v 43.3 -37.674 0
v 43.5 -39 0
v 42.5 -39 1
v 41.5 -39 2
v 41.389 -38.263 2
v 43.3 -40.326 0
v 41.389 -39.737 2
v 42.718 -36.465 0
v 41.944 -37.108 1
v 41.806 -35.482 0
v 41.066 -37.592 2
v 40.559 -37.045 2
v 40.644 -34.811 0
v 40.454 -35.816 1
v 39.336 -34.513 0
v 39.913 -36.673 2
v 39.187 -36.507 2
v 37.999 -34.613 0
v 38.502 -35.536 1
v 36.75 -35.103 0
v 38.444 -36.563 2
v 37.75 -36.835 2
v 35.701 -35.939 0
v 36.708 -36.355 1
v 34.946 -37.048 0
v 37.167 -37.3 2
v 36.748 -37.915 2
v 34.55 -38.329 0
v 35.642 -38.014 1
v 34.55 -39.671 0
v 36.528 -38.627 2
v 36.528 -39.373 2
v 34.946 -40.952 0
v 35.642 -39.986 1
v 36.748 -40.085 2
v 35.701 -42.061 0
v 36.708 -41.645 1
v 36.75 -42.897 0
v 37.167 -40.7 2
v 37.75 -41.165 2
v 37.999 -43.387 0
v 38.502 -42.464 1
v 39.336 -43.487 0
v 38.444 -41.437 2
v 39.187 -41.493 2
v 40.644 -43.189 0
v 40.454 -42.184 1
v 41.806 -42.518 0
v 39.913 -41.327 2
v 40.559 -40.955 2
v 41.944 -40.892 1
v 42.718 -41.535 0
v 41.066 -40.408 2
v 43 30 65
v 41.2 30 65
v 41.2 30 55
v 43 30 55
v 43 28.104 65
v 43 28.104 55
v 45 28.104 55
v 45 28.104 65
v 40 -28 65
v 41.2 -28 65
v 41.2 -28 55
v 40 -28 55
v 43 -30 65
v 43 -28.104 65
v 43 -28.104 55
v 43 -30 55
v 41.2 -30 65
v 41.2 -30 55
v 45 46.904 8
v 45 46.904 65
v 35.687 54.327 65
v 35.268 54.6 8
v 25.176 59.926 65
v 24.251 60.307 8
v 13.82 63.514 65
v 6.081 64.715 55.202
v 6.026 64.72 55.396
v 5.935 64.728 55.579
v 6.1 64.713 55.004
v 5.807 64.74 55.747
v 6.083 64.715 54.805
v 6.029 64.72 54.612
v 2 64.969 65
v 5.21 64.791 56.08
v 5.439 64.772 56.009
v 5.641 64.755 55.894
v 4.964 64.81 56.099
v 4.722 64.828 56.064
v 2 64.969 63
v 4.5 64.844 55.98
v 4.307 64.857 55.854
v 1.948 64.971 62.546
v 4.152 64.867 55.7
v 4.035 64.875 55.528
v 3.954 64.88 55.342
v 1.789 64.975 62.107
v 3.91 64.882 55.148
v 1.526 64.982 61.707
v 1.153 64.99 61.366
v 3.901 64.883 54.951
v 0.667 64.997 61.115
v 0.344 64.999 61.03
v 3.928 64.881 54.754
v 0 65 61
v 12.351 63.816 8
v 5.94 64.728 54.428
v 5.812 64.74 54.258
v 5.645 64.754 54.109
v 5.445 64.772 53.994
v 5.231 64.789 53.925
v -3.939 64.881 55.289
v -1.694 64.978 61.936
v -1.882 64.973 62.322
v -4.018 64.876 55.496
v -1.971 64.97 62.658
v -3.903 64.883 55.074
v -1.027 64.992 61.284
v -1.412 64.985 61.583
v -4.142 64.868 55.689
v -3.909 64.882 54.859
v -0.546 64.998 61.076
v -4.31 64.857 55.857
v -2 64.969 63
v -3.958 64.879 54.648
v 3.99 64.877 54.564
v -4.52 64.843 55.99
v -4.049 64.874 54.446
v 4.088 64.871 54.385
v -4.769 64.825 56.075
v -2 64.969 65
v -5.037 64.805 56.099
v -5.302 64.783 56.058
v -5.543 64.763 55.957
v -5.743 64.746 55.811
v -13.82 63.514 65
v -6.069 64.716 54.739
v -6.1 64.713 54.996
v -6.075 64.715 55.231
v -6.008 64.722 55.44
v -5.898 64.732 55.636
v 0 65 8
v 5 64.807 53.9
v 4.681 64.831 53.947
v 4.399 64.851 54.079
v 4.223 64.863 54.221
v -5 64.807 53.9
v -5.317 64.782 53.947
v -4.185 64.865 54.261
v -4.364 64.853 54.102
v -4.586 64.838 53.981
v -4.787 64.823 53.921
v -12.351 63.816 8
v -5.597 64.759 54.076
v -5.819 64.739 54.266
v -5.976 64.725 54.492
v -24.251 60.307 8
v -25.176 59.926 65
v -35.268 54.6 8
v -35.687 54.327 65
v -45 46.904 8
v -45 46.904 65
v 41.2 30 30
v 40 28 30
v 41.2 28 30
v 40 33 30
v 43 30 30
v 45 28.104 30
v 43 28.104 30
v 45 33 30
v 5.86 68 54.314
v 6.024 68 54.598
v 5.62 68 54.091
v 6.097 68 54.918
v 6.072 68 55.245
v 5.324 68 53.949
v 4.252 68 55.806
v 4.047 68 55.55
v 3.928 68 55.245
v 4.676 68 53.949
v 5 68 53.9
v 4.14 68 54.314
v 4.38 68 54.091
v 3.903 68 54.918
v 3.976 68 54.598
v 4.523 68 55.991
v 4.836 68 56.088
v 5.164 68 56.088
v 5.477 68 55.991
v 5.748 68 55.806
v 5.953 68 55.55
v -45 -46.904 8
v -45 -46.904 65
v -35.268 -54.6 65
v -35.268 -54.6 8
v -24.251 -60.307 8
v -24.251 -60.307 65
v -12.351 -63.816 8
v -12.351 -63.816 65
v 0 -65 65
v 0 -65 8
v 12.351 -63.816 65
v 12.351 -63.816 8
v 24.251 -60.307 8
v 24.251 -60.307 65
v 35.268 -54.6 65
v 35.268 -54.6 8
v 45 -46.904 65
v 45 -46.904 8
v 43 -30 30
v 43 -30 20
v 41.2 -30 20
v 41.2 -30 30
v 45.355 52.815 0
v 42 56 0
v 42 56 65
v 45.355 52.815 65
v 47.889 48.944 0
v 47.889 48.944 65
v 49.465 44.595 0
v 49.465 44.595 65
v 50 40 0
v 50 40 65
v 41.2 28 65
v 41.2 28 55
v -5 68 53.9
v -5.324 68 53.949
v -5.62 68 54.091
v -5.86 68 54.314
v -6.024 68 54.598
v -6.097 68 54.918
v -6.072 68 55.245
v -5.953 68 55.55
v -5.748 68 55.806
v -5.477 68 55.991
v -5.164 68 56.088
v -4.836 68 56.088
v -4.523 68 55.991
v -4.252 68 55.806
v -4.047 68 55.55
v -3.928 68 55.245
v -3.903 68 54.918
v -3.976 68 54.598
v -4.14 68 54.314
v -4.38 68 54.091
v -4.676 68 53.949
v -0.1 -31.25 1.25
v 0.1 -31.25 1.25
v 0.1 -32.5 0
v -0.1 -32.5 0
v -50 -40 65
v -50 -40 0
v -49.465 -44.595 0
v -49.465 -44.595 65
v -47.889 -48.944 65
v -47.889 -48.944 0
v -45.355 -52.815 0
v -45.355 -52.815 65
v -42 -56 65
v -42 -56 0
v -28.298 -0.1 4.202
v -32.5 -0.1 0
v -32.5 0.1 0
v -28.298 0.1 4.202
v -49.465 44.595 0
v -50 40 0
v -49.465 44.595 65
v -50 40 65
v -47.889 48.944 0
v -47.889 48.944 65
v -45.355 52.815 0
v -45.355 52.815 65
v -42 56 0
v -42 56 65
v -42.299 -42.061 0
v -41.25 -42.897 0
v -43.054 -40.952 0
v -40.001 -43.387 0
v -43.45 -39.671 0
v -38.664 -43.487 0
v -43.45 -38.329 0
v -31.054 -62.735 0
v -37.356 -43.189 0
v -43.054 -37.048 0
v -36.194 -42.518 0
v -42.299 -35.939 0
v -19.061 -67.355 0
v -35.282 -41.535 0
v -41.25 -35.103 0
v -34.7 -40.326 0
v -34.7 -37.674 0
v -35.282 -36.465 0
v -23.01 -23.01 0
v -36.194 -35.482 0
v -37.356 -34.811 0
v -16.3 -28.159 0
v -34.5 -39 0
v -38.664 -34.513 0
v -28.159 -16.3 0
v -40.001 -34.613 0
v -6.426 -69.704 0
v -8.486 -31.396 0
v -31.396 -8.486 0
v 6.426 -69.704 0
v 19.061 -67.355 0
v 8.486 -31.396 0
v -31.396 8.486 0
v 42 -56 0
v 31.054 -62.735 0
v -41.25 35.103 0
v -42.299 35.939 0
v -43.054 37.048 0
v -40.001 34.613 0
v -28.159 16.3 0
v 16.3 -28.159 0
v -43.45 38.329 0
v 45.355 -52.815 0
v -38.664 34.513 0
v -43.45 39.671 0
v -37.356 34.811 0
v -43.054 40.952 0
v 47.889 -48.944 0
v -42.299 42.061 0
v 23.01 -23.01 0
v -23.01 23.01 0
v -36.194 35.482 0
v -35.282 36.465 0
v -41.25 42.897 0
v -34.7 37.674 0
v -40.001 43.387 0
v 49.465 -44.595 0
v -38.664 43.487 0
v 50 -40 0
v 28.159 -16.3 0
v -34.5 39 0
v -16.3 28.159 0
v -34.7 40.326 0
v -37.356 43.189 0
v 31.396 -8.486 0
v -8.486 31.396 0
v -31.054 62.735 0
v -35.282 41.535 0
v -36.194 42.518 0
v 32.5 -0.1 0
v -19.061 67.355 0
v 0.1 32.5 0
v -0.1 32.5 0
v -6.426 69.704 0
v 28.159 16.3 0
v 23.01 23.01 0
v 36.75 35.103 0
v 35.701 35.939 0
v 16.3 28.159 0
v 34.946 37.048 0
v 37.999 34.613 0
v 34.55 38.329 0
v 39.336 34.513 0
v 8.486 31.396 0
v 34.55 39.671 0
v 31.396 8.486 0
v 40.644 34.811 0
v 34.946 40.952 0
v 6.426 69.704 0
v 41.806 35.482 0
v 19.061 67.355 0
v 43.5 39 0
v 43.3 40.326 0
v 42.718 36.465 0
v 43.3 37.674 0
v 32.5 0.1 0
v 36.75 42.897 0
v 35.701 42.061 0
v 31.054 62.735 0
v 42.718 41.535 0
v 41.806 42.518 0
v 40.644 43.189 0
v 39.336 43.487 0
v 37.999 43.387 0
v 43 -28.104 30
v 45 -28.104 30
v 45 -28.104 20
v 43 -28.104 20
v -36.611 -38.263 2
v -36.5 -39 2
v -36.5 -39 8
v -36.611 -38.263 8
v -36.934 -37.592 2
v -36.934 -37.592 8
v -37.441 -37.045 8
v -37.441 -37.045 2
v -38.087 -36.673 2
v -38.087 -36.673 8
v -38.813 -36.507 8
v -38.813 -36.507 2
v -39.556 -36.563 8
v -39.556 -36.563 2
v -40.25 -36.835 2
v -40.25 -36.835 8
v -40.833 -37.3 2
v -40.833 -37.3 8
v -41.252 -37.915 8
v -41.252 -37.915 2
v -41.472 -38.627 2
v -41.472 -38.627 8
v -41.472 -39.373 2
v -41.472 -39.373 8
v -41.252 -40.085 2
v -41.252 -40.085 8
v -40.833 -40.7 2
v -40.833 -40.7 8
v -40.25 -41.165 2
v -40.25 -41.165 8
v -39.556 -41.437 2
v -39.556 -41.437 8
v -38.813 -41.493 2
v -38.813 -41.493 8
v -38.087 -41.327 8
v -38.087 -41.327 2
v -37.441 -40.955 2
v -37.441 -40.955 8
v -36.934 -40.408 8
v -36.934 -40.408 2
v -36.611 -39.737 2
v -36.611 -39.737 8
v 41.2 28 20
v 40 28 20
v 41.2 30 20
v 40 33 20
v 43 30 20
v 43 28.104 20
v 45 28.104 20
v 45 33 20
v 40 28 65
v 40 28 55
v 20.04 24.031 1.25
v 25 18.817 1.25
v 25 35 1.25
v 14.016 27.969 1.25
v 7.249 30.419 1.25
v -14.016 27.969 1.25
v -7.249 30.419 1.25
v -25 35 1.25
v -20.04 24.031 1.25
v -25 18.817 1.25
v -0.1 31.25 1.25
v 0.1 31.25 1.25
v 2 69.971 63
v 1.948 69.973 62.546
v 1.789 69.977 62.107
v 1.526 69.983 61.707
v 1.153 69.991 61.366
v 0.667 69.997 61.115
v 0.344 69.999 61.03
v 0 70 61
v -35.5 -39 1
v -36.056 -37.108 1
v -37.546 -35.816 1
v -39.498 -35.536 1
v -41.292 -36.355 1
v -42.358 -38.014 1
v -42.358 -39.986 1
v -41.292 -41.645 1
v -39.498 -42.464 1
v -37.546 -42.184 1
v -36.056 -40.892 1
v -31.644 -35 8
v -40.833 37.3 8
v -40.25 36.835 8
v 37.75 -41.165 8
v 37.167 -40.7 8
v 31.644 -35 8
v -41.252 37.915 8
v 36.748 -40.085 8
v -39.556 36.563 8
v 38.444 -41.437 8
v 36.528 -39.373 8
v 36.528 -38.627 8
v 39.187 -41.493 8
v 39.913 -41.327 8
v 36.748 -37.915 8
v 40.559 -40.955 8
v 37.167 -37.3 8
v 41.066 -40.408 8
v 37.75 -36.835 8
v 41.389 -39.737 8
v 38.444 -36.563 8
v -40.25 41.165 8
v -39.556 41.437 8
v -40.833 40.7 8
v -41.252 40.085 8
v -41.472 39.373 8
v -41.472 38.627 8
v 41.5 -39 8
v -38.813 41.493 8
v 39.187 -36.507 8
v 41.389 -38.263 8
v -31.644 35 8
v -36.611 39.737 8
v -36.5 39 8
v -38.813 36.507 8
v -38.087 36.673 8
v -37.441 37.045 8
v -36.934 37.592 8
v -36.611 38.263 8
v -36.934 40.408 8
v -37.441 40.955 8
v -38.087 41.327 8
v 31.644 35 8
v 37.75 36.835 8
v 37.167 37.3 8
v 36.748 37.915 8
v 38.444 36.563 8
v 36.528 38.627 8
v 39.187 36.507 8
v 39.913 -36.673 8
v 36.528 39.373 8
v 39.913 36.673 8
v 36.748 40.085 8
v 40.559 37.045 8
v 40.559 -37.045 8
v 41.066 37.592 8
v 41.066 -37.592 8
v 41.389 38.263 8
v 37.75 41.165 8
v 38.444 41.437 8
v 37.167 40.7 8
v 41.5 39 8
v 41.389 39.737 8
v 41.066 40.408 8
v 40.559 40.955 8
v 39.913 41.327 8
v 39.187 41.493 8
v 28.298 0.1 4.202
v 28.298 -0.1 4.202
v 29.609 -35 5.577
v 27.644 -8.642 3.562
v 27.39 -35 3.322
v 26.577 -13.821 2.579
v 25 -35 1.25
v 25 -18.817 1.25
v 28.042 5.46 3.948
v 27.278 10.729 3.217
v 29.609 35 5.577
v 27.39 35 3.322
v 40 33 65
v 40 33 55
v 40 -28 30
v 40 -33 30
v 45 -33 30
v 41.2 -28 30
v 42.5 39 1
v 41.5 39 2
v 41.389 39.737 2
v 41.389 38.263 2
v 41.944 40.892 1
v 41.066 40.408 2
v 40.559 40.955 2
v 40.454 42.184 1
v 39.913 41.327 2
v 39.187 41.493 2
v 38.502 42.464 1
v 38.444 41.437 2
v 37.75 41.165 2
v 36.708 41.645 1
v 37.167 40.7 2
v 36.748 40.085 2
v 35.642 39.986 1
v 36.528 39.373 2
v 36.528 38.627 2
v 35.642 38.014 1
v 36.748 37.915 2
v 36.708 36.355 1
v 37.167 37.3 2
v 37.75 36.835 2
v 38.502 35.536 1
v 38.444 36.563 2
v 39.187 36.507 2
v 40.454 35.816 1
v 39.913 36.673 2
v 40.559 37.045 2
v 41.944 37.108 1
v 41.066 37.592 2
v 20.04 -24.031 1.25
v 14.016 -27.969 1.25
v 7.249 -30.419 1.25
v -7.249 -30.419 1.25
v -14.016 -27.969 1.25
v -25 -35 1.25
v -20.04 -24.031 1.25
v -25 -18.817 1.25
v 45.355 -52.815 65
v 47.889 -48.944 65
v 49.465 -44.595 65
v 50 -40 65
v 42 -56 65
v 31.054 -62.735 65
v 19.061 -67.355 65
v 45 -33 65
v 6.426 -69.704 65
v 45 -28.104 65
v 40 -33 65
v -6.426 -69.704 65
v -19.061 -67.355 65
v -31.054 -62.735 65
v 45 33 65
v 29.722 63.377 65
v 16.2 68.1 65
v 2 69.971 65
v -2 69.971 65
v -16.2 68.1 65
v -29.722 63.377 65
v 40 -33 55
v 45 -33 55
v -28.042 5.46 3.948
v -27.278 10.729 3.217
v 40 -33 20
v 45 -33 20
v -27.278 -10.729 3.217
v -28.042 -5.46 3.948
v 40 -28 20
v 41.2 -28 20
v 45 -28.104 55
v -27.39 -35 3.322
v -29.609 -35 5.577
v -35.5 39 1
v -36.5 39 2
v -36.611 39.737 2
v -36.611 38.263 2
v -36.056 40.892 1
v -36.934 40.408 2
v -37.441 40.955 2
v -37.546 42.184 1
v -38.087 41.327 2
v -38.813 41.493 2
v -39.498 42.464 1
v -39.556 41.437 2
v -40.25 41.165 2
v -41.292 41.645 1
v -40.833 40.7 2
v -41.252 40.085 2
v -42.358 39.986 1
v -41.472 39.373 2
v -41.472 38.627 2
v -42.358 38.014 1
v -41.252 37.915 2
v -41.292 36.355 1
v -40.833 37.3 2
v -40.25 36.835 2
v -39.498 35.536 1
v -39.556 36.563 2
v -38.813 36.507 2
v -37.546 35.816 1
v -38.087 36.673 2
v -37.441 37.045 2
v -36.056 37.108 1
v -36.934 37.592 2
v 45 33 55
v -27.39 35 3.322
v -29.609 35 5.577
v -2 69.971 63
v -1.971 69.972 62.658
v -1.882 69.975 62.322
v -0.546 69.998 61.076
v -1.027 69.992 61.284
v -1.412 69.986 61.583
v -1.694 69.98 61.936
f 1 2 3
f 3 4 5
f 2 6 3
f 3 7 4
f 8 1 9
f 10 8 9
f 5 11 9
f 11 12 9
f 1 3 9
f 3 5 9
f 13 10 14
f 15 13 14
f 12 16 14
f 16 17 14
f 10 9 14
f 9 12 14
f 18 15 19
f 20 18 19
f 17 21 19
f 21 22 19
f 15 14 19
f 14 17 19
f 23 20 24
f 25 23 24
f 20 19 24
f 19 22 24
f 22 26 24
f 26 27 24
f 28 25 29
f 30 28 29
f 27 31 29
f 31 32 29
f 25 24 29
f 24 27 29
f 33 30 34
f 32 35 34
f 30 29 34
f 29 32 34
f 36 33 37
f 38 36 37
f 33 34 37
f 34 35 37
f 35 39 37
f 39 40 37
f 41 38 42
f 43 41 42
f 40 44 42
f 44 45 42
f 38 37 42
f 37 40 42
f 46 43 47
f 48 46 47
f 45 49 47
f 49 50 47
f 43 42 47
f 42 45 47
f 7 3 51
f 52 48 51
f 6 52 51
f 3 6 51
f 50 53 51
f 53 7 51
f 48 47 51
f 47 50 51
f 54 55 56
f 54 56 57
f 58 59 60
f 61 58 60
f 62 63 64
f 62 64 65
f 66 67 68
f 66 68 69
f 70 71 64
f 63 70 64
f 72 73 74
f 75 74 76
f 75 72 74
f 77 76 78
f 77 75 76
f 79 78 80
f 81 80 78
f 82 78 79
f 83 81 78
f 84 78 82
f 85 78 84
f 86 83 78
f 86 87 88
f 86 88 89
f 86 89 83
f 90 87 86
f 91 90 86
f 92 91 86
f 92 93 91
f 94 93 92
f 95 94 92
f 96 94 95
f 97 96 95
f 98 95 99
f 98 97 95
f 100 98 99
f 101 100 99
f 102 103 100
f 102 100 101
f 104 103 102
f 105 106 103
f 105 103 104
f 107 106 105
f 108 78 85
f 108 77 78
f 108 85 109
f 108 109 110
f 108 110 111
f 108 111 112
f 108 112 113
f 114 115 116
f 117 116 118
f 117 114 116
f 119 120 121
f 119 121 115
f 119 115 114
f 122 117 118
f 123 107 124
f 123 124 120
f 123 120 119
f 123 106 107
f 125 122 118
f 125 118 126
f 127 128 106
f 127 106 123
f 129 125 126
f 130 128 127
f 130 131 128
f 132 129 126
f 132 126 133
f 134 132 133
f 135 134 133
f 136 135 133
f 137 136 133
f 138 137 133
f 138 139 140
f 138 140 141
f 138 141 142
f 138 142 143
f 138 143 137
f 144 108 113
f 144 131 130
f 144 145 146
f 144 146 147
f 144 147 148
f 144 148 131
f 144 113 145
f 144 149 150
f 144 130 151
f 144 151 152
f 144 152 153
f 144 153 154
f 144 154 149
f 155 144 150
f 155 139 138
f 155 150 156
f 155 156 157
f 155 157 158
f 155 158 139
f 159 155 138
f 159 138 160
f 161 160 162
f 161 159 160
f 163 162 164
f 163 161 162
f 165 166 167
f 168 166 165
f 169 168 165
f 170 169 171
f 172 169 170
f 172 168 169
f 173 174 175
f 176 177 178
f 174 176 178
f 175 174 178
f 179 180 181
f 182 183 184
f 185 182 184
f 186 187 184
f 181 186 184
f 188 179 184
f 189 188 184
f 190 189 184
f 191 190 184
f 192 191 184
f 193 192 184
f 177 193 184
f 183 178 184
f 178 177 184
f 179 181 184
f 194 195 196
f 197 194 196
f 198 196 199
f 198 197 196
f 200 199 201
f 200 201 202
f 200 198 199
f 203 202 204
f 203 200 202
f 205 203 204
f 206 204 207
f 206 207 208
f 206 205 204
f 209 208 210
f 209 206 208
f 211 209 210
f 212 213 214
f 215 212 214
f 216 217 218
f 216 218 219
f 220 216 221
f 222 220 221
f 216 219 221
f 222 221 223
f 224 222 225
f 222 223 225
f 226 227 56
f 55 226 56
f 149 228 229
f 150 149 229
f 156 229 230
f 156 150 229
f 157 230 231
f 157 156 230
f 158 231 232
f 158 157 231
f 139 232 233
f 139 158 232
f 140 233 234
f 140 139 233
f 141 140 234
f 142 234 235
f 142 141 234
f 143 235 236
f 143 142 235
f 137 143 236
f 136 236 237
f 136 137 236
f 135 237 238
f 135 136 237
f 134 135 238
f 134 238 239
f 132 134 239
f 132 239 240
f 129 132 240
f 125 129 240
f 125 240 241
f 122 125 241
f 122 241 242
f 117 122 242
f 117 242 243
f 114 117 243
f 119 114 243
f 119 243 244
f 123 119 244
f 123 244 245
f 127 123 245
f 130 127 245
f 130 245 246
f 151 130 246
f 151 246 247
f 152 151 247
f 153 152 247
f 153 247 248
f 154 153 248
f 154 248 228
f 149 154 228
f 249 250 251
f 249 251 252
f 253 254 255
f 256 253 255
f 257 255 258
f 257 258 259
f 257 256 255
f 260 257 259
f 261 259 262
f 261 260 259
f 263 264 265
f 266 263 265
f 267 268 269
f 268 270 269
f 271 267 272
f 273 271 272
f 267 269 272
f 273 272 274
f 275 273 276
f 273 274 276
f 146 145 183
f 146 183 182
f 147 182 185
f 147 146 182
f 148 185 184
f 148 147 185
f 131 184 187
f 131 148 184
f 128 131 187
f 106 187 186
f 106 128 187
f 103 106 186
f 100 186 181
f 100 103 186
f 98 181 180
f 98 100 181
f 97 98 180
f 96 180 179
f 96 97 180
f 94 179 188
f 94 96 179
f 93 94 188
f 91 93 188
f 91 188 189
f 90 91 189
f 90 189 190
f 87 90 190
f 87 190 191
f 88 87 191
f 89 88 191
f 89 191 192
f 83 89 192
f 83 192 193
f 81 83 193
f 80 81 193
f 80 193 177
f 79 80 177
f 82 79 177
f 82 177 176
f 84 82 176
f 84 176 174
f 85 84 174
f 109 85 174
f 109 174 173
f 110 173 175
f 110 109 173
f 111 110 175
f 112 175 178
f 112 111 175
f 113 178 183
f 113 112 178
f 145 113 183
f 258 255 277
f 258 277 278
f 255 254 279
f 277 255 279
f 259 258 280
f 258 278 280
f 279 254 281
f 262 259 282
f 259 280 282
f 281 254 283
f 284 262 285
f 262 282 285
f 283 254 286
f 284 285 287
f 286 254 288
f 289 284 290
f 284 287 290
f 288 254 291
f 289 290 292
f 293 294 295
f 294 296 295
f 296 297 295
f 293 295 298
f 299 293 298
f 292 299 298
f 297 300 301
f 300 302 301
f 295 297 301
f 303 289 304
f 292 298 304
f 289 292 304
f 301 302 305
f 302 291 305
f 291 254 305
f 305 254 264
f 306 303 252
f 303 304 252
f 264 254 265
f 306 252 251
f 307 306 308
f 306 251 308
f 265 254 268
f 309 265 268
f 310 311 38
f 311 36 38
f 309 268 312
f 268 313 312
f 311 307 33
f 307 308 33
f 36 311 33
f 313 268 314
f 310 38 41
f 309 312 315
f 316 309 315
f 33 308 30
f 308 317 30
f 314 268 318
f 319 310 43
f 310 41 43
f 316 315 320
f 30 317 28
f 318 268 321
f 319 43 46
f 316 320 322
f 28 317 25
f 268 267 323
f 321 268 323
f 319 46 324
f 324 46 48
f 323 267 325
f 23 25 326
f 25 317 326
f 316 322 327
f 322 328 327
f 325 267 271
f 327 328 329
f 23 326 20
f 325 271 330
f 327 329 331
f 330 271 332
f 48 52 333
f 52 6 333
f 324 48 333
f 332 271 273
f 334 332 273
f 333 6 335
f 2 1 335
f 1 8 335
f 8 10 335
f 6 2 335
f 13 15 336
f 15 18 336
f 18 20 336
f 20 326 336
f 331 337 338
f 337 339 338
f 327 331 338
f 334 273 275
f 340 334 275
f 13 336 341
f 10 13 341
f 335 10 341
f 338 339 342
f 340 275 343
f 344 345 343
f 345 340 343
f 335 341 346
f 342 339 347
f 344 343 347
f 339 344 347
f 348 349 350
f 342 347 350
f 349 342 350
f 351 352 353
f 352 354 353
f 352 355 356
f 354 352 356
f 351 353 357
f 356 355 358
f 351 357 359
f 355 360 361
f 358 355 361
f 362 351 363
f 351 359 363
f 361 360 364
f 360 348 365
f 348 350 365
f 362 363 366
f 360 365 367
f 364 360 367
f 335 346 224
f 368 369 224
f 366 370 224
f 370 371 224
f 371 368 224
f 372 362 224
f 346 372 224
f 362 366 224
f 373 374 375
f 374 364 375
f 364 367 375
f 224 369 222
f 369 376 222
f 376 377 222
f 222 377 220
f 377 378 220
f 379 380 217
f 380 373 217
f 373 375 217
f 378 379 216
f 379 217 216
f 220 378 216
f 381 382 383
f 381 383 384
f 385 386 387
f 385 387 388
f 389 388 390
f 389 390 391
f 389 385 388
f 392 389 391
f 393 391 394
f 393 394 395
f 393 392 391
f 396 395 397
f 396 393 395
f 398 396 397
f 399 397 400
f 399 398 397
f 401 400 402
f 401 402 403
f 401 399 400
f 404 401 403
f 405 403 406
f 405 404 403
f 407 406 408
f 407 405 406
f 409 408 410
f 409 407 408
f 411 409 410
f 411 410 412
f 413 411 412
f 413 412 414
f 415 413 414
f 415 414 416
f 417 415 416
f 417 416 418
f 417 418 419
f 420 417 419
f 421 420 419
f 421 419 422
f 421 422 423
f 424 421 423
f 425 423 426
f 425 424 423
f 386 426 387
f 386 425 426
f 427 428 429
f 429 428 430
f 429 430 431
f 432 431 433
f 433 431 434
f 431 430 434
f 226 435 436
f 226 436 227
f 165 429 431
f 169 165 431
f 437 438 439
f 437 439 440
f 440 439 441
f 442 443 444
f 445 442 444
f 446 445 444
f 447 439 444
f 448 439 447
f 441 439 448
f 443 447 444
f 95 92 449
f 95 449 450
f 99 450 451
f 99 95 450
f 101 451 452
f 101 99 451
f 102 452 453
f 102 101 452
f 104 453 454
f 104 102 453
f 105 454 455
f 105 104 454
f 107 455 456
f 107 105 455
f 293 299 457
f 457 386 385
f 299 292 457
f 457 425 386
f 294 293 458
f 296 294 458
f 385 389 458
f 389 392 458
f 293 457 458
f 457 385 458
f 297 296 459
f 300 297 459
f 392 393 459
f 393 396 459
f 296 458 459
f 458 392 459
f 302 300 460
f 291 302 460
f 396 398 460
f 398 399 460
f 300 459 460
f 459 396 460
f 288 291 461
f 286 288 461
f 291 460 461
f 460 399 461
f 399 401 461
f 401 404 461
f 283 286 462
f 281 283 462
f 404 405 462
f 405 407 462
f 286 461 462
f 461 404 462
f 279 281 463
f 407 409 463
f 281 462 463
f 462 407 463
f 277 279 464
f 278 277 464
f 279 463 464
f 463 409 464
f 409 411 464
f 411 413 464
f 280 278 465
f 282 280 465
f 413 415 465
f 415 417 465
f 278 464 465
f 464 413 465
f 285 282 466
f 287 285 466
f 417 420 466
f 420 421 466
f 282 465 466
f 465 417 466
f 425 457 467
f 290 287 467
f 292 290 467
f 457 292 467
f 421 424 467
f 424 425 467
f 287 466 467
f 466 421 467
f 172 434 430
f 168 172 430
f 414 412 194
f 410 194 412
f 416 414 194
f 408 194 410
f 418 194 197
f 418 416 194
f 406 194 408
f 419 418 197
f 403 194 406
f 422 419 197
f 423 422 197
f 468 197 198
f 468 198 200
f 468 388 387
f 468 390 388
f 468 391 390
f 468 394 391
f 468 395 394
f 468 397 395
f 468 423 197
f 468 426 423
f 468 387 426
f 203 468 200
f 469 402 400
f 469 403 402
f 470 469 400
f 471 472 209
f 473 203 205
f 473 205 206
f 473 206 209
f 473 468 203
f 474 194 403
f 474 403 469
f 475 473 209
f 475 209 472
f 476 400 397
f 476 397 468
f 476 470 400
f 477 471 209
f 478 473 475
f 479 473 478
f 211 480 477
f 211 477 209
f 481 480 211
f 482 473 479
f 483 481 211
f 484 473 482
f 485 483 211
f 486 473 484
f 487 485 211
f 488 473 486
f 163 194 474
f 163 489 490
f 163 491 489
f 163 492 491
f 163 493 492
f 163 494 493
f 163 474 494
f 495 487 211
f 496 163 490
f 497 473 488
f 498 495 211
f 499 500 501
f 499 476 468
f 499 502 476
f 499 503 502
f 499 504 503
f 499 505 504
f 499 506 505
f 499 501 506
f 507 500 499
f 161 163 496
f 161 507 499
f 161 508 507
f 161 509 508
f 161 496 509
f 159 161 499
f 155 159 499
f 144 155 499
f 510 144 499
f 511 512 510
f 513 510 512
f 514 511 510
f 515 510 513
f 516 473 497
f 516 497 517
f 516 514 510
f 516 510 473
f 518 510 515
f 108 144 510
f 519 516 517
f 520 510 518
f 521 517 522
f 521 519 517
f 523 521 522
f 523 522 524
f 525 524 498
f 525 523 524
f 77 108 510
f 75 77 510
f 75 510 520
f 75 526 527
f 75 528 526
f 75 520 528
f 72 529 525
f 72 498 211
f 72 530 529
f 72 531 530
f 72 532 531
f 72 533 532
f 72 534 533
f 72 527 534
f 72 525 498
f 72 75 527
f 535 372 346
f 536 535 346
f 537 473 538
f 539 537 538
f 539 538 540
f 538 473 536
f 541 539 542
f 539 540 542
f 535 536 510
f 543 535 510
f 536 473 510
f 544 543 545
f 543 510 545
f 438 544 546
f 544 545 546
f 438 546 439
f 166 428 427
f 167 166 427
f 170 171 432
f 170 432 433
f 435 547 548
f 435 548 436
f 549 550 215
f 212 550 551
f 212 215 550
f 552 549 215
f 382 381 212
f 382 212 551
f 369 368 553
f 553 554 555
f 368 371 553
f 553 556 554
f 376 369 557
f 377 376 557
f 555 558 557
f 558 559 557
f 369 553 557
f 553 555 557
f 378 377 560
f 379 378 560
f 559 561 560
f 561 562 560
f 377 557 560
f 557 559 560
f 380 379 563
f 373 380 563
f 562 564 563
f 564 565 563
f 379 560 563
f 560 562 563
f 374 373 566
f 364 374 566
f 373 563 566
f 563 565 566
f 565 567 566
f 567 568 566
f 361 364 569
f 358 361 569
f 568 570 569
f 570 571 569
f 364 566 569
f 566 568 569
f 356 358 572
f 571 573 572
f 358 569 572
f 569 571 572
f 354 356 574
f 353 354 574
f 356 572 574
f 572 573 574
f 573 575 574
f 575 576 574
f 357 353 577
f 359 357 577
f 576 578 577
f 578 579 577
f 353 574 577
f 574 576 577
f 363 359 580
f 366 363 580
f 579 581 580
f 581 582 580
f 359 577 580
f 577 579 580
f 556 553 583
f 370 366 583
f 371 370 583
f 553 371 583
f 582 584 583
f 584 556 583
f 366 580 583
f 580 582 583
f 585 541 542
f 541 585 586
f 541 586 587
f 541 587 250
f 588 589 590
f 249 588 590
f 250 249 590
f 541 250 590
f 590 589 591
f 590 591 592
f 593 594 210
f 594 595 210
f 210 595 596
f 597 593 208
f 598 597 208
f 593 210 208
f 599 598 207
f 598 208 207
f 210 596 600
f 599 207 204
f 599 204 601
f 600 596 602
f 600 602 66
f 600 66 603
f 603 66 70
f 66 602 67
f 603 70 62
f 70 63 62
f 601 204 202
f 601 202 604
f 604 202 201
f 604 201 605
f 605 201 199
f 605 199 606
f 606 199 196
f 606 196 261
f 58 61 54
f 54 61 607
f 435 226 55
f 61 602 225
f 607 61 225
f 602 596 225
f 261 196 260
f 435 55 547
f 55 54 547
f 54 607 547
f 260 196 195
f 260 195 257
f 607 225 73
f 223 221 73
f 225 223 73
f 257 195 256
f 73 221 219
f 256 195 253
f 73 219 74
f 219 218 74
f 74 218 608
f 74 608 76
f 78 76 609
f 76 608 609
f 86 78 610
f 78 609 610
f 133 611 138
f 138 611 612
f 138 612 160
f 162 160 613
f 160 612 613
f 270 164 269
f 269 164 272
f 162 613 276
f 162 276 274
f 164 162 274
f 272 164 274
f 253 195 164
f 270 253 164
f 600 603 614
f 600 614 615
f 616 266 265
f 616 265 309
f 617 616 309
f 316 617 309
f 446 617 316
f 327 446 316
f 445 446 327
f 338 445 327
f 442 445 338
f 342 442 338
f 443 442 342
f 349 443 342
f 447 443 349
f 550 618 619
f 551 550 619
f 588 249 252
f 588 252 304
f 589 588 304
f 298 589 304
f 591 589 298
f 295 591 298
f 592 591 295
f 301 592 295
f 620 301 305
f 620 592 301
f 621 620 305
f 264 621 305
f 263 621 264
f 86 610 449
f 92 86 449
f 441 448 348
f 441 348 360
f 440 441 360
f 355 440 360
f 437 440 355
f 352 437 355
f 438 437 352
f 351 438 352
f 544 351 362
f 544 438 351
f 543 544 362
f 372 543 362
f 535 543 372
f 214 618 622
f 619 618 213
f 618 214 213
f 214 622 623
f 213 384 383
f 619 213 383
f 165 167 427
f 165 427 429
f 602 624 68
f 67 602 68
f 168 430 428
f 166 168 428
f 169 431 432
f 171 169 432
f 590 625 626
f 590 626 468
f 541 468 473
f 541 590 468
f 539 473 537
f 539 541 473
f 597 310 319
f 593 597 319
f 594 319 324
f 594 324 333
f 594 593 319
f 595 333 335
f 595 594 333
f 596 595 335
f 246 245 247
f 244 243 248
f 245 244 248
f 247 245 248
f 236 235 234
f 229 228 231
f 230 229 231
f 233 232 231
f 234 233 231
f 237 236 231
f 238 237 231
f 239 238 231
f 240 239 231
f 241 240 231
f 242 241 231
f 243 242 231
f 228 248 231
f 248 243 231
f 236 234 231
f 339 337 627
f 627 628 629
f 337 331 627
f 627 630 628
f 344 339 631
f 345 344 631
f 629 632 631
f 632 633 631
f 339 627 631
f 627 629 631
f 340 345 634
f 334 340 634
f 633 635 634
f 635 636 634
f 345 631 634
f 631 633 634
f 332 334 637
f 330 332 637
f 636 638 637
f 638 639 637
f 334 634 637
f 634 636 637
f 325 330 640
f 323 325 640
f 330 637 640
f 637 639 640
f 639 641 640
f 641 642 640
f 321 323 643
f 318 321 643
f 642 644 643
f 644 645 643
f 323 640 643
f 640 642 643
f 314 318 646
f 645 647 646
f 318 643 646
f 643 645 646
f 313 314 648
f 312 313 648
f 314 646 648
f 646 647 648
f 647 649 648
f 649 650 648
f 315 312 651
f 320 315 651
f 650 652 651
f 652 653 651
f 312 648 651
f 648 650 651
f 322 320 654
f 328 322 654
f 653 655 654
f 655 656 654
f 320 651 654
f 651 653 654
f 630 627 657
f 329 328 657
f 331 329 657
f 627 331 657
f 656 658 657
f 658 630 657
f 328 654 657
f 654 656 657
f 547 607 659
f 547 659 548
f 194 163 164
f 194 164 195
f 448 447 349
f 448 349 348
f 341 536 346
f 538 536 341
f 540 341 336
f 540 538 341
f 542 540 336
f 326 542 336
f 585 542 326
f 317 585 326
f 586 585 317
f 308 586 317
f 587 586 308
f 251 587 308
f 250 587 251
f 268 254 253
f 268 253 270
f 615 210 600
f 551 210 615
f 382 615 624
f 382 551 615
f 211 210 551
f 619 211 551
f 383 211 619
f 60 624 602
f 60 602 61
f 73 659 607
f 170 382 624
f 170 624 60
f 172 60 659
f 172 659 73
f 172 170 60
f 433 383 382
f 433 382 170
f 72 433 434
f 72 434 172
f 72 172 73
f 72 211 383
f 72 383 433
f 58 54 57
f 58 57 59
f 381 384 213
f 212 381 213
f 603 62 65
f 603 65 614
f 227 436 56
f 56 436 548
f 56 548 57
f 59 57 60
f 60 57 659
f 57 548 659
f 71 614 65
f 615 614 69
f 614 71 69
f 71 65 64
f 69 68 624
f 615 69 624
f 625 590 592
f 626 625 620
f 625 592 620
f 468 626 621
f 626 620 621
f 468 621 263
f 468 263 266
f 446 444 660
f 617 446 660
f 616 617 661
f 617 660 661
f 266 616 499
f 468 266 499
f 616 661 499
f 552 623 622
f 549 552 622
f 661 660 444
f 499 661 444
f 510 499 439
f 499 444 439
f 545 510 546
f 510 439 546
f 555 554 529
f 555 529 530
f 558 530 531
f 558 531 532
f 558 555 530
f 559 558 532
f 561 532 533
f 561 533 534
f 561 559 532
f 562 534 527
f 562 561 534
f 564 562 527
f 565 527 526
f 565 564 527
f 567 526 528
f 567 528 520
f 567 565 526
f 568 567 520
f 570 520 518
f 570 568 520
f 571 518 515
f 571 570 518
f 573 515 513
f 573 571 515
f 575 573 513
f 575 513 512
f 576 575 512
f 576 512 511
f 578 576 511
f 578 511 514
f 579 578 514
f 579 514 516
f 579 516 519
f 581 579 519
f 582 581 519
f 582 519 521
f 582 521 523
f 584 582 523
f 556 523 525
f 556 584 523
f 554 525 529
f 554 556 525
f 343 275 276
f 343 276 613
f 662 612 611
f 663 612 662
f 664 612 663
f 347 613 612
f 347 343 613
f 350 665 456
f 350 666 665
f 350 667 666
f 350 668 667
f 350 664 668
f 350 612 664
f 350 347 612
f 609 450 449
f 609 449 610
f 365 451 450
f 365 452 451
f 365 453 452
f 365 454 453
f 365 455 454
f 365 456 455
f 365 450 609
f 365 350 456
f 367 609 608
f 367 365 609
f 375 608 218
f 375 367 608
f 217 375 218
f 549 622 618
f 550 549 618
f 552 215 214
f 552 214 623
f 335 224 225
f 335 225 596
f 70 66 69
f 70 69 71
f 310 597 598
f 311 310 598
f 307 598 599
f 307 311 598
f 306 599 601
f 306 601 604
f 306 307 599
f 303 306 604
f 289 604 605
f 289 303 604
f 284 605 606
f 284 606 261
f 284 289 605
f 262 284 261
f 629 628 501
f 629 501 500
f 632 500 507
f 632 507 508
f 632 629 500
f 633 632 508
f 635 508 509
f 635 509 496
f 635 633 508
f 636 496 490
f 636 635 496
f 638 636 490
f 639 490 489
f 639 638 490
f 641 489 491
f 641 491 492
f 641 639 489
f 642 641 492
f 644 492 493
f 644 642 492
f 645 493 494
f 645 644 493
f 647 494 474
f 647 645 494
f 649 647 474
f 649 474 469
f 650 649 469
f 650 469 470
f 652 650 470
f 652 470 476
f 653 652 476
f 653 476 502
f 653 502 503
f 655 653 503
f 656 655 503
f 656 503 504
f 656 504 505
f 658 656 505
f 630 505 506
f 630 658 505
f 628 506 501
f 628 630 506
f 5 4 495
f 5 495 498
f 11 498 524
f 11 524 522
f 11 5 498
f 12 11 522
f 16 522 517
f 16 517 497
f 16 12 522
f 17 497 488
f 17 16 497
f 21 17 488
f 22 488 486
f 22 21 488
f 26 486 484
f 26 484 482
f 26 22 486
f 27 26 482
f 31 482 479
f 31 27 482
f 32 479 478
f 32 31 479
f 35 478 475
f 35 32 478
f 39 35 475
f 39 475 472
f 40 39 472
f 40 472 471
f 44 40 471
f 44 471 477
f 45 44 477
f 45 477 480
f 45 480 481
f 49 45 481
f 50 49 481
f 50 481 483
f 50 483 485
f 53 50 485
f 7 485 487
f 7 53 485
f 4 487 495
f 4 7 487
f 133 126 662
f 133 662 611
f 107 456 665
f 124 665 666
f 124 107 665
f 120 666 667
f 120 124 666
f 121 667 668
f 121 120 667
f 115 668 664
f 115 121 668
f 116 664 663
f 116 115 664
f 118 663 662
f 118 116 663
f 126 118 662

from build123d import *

# Parameters (mm, degrees)
EXTRUDE_2_DEPTH     = 65
SKETCH_1_3_R        = 2.5
BOSS_EXTRUDE1_DEPTH = 8
FILLET1_R           = 20
CHAMFER3_SIZE       = 5
BOSS_EXTRUDE3_DEPTH = 10
BOSS_EXTRUDE4_START = -45
BOSS_EXTRUDE4_DEPTH = 10
CUT_EXTRUDE2_DEPTH  = 108.819293264
SKETCH5_4_R         = 1.1
CUT_EXTRUDE3_DEPTH  = 68
CUT_EXTRUDE4_DEPTH  = 35
CHAMFER4_SIZE       = 2


with BuildPart() as part:
    # Эскиз1 → Extrude 2 (new body)
    with BuildSketch(Plane.XY):
        with BuildLine():
            ThreePointArc((-50, -48.989794856), (0, -70), (50, -48.989794856))
            Line((50, -48.989794856), (50, 48.989794856))
            ThreePointArc((50, 48.989794856), (0, 70), (-50, 48.989794856))
            Line((-50, 48.989794856), (-50, -48.989794856))
        make_face()
        with BuildLine():
            Line((45, -29.057462995), (45, -46.904157598))
            ThreePointArc((45, -46.904157598), (37.452737255, -53.125252678), (29.057462995, -58.143476369))
            ThreePointArc((29.057462995, -58.143476369), (0, -65), (-29.057462995, -58.143476369))
            ThreePointArc((-29.057462995, -58.143476369), (-37.452737255, -53.125252678), (-45, -46.904157598))
            Line((-45, -46.904157598), (-45, -29.057462995))
            Line((-45, -29.057462995), (-45, 29.057462995))
            Line((-45, 29.057462995), (-45, 46.904157598))
            ThreePointArc((-45, 46.904157598), (-37.452737255, 53.125252678), (-29.057462995, 58.143476369))
            ThreePointArc((-29.057462995, 58.143476369), (0, 65), (29.057462995, 58.143476369))
            ThreePointArc((29.057462995, 58.143476369), (37.452737255, 53.125252678), (45, 46.904157598))
            Line((45, 46.904157598), (45, 29.057462995))
            Line((45, 29.057462995), (45, -29.057462995))
        make_face(mode=Mode.SUBTRACT)
    extrude(amount=EXTRUDE_2_DEPTH)

    # Эскиз1<3> → Boss-Extrude1 (add)
    with BuildSketch(Plane.XY):
        with BuildLine():
            Line((45, -46.904157598), (45, 46.904157598))
            ThreePointArc((45, 46.904157598), (0, 65), (-45, 46.904157598))
            Line((-45, 46.904157598), (-45, -46.904157598))
            ThreePointArc((-45, -46.904157598), (0, -65), (45, -46.904157598))
        make_face()
        with Locations((39, -39)):
            Circle(SKETCH_1_3_R, mode=Mode.SUBTRACT)
        with BuildLine():
            Line((27.5, 0.1), (27.5, -0.1))
            ThreePointArc((27.5, -0.1), (19.474725805, -19.474725805), (0.1, -27.5))
            Line((0.1, -27.5), (-0.1, -27.5))
            ThreePointArc((-0.1, -27.5), (-19.474725805, -19.474725805), (-27.5, -0.1))
            Line((-27.5, -0.1), (-27.5, 0.1))
            ThreePointArc((-27.5, 0.1), (-19.474725805, 19.474725805), (-0.1, 27.5))
            Line((-0.1, 27.5), (0.1, 27.5))
            ThreePointArc((0.1, 27.5), (19.474725805, 19.474725805), (27.5, 0.1))
        make_face(mode=Mode.SUBTRACT)
        with Locations((-39, -39)):
            Circle(SKETCH_1_3_R, mode=Mode.SUBTRACT)
        with Locations((-39, 39)):
            Circle(SKETCH_1_3_R, mode=Mode.SUBTRACT)
        with Locations((39, 39)):
            Circle(SKETCH_1_3_R, mode=Mode.SUBTRACT)
    extrude(amount=BOSS_EXTRUDE1_DEPTH)

    # Fillet1
    fillet1_edges = [part.edges().sort_by_distance(p)[0] for p in [
        (50, -48.989794856, 32.5),
        (-50, -48.989794856, 32.5),
        (-50, 48.989794856, 32.5),
        (50, 48.989794856, 32.5),
    ]]
    fillet(fillet1_edges, radius=FILLET1_R)

    # Chamfer3
    chamfer3_edges = [part.edges().sort_by_distance(p)[0] for p in [
        (27.5, 0, 0),
        (19.474725805, 19.474725805, 0),
        (19.474725805, -19.474725805, 0),
        (0, 27.5, 0),
        (0, -27.5, 0),
        (-19.474725805, 19.474725805, 0),
        (-19.474725805, -19.474725805, 0),
        (-27.5, 0, 0),
    ]]
    chamfer(chamfer3_edges, length=CHAMFER3_SIZE)

    # Sketch3 → Boss-Extrude3 (add)
    with BuildSketch(Plane.XY.offset(65)):
        Polygon((41.2, -30), (41.2, -28), (40, -28), (40, -33), (45, -33), (45, -28.104490543), (43, -28.104490543), (43, -30), align=None)
        Polygon((45, 28.104490543), (45, 33), (40, 33), (40, 28), (41.2, 28), (41.2, 30), (43, 30), (43, 28.104490543), align=None)
    extrude(amount=-BOSS_EXTRUDE3_DEPTH)

    # Sketch3<2> → Boss-Extrude4 (add)
    with BuildSketch(Plane.XY.offset(65).offset(BOSS_EXTRUDE4_START)):
        Polygon((41.2, -30), (41.2, -28), (40, -28), (40, -33), (45, -33), (45, -28.104490543), (43, -28.104490543), (43, -30), align=None)
        Polygon((45, 28.104490543), (45, 33), (40, 33), (40, 28), (41.2, 28), (41.2, 30), (43, 30), (43, 28.104490543), align=None)
    extrude(amount=BOSS_EXTRUDE4_DEPTH)

    # Sketch5 → Cut-Extrude2 (cut, through all)
    with BuildSketch(Plane(origin=(0, 0, 0), x_dir=(1, 0, 0), z_dir=(0, 1, 0))):
        with BuildLine():
            ThreePointArc((2, -63), (0, -61), (-2, -63))
            Line((-2, -63), (-2, -65))
            Line((-2, -65), (2, -65))
            Line((2, -65), (2, -63))
        make_face()
    extrude(amount=CUT_EXTRUDE2_DEPTH, mode=Mode.SUBTRACT)

    # Sketch5<4> → Cut-Extrude3 (cut)
    with BuildSketch(Plane(origin=(0, 0, 0), x_dir=(1, 0, 0), z_dir=(0, 1, 0))):
        with Locations((5, -55)):
            Circle(SKETCH5_4_R)
        with Locations((-5, -55)):
            Circle(SKETCH5_4_R)
    extrude(amount=CUT_EXTRUDE3_DEPTH, mode=Mode.SUBTRACT)

    # Sketch6 → Cut-Extrude4 (cut, symmetric)
    with BuildSketch(Plane(origin=(0, 0, 0), x_dir=(1, 0, 0), z_dir=(0, 1, 0))):
        with BuildLine():
            Line((25, -1.25), (-25, -1.25))
            ThreePointArc((-25, -1.25), (-28.522145397, -4.427776683), (-31.643522244, -8))
            Line((-31.643522244, -8), (31.643522244, -8))
            ThreePointArc((31.643522244, -8), (28.522145397, -4.427776683), (25, -1.25))
        make_face()
    extrude(amount=CUT_EXTRUDE4_DEPTH, both=True, mode=Mode.SUBTRACT)

    # Chamfer4
    chamfer4_edges = [part.edges().sort_by_distance(p)[0] for p in [
        (36.5, 39, 0),
        (-41.5, 39, 0),
        (-41.5, -39, 0),
        (36.5, -39, 0),
    ]]
    chamfer(chamfer4_edges, length=CHAMFER4_SIZE)


solid = part.part
